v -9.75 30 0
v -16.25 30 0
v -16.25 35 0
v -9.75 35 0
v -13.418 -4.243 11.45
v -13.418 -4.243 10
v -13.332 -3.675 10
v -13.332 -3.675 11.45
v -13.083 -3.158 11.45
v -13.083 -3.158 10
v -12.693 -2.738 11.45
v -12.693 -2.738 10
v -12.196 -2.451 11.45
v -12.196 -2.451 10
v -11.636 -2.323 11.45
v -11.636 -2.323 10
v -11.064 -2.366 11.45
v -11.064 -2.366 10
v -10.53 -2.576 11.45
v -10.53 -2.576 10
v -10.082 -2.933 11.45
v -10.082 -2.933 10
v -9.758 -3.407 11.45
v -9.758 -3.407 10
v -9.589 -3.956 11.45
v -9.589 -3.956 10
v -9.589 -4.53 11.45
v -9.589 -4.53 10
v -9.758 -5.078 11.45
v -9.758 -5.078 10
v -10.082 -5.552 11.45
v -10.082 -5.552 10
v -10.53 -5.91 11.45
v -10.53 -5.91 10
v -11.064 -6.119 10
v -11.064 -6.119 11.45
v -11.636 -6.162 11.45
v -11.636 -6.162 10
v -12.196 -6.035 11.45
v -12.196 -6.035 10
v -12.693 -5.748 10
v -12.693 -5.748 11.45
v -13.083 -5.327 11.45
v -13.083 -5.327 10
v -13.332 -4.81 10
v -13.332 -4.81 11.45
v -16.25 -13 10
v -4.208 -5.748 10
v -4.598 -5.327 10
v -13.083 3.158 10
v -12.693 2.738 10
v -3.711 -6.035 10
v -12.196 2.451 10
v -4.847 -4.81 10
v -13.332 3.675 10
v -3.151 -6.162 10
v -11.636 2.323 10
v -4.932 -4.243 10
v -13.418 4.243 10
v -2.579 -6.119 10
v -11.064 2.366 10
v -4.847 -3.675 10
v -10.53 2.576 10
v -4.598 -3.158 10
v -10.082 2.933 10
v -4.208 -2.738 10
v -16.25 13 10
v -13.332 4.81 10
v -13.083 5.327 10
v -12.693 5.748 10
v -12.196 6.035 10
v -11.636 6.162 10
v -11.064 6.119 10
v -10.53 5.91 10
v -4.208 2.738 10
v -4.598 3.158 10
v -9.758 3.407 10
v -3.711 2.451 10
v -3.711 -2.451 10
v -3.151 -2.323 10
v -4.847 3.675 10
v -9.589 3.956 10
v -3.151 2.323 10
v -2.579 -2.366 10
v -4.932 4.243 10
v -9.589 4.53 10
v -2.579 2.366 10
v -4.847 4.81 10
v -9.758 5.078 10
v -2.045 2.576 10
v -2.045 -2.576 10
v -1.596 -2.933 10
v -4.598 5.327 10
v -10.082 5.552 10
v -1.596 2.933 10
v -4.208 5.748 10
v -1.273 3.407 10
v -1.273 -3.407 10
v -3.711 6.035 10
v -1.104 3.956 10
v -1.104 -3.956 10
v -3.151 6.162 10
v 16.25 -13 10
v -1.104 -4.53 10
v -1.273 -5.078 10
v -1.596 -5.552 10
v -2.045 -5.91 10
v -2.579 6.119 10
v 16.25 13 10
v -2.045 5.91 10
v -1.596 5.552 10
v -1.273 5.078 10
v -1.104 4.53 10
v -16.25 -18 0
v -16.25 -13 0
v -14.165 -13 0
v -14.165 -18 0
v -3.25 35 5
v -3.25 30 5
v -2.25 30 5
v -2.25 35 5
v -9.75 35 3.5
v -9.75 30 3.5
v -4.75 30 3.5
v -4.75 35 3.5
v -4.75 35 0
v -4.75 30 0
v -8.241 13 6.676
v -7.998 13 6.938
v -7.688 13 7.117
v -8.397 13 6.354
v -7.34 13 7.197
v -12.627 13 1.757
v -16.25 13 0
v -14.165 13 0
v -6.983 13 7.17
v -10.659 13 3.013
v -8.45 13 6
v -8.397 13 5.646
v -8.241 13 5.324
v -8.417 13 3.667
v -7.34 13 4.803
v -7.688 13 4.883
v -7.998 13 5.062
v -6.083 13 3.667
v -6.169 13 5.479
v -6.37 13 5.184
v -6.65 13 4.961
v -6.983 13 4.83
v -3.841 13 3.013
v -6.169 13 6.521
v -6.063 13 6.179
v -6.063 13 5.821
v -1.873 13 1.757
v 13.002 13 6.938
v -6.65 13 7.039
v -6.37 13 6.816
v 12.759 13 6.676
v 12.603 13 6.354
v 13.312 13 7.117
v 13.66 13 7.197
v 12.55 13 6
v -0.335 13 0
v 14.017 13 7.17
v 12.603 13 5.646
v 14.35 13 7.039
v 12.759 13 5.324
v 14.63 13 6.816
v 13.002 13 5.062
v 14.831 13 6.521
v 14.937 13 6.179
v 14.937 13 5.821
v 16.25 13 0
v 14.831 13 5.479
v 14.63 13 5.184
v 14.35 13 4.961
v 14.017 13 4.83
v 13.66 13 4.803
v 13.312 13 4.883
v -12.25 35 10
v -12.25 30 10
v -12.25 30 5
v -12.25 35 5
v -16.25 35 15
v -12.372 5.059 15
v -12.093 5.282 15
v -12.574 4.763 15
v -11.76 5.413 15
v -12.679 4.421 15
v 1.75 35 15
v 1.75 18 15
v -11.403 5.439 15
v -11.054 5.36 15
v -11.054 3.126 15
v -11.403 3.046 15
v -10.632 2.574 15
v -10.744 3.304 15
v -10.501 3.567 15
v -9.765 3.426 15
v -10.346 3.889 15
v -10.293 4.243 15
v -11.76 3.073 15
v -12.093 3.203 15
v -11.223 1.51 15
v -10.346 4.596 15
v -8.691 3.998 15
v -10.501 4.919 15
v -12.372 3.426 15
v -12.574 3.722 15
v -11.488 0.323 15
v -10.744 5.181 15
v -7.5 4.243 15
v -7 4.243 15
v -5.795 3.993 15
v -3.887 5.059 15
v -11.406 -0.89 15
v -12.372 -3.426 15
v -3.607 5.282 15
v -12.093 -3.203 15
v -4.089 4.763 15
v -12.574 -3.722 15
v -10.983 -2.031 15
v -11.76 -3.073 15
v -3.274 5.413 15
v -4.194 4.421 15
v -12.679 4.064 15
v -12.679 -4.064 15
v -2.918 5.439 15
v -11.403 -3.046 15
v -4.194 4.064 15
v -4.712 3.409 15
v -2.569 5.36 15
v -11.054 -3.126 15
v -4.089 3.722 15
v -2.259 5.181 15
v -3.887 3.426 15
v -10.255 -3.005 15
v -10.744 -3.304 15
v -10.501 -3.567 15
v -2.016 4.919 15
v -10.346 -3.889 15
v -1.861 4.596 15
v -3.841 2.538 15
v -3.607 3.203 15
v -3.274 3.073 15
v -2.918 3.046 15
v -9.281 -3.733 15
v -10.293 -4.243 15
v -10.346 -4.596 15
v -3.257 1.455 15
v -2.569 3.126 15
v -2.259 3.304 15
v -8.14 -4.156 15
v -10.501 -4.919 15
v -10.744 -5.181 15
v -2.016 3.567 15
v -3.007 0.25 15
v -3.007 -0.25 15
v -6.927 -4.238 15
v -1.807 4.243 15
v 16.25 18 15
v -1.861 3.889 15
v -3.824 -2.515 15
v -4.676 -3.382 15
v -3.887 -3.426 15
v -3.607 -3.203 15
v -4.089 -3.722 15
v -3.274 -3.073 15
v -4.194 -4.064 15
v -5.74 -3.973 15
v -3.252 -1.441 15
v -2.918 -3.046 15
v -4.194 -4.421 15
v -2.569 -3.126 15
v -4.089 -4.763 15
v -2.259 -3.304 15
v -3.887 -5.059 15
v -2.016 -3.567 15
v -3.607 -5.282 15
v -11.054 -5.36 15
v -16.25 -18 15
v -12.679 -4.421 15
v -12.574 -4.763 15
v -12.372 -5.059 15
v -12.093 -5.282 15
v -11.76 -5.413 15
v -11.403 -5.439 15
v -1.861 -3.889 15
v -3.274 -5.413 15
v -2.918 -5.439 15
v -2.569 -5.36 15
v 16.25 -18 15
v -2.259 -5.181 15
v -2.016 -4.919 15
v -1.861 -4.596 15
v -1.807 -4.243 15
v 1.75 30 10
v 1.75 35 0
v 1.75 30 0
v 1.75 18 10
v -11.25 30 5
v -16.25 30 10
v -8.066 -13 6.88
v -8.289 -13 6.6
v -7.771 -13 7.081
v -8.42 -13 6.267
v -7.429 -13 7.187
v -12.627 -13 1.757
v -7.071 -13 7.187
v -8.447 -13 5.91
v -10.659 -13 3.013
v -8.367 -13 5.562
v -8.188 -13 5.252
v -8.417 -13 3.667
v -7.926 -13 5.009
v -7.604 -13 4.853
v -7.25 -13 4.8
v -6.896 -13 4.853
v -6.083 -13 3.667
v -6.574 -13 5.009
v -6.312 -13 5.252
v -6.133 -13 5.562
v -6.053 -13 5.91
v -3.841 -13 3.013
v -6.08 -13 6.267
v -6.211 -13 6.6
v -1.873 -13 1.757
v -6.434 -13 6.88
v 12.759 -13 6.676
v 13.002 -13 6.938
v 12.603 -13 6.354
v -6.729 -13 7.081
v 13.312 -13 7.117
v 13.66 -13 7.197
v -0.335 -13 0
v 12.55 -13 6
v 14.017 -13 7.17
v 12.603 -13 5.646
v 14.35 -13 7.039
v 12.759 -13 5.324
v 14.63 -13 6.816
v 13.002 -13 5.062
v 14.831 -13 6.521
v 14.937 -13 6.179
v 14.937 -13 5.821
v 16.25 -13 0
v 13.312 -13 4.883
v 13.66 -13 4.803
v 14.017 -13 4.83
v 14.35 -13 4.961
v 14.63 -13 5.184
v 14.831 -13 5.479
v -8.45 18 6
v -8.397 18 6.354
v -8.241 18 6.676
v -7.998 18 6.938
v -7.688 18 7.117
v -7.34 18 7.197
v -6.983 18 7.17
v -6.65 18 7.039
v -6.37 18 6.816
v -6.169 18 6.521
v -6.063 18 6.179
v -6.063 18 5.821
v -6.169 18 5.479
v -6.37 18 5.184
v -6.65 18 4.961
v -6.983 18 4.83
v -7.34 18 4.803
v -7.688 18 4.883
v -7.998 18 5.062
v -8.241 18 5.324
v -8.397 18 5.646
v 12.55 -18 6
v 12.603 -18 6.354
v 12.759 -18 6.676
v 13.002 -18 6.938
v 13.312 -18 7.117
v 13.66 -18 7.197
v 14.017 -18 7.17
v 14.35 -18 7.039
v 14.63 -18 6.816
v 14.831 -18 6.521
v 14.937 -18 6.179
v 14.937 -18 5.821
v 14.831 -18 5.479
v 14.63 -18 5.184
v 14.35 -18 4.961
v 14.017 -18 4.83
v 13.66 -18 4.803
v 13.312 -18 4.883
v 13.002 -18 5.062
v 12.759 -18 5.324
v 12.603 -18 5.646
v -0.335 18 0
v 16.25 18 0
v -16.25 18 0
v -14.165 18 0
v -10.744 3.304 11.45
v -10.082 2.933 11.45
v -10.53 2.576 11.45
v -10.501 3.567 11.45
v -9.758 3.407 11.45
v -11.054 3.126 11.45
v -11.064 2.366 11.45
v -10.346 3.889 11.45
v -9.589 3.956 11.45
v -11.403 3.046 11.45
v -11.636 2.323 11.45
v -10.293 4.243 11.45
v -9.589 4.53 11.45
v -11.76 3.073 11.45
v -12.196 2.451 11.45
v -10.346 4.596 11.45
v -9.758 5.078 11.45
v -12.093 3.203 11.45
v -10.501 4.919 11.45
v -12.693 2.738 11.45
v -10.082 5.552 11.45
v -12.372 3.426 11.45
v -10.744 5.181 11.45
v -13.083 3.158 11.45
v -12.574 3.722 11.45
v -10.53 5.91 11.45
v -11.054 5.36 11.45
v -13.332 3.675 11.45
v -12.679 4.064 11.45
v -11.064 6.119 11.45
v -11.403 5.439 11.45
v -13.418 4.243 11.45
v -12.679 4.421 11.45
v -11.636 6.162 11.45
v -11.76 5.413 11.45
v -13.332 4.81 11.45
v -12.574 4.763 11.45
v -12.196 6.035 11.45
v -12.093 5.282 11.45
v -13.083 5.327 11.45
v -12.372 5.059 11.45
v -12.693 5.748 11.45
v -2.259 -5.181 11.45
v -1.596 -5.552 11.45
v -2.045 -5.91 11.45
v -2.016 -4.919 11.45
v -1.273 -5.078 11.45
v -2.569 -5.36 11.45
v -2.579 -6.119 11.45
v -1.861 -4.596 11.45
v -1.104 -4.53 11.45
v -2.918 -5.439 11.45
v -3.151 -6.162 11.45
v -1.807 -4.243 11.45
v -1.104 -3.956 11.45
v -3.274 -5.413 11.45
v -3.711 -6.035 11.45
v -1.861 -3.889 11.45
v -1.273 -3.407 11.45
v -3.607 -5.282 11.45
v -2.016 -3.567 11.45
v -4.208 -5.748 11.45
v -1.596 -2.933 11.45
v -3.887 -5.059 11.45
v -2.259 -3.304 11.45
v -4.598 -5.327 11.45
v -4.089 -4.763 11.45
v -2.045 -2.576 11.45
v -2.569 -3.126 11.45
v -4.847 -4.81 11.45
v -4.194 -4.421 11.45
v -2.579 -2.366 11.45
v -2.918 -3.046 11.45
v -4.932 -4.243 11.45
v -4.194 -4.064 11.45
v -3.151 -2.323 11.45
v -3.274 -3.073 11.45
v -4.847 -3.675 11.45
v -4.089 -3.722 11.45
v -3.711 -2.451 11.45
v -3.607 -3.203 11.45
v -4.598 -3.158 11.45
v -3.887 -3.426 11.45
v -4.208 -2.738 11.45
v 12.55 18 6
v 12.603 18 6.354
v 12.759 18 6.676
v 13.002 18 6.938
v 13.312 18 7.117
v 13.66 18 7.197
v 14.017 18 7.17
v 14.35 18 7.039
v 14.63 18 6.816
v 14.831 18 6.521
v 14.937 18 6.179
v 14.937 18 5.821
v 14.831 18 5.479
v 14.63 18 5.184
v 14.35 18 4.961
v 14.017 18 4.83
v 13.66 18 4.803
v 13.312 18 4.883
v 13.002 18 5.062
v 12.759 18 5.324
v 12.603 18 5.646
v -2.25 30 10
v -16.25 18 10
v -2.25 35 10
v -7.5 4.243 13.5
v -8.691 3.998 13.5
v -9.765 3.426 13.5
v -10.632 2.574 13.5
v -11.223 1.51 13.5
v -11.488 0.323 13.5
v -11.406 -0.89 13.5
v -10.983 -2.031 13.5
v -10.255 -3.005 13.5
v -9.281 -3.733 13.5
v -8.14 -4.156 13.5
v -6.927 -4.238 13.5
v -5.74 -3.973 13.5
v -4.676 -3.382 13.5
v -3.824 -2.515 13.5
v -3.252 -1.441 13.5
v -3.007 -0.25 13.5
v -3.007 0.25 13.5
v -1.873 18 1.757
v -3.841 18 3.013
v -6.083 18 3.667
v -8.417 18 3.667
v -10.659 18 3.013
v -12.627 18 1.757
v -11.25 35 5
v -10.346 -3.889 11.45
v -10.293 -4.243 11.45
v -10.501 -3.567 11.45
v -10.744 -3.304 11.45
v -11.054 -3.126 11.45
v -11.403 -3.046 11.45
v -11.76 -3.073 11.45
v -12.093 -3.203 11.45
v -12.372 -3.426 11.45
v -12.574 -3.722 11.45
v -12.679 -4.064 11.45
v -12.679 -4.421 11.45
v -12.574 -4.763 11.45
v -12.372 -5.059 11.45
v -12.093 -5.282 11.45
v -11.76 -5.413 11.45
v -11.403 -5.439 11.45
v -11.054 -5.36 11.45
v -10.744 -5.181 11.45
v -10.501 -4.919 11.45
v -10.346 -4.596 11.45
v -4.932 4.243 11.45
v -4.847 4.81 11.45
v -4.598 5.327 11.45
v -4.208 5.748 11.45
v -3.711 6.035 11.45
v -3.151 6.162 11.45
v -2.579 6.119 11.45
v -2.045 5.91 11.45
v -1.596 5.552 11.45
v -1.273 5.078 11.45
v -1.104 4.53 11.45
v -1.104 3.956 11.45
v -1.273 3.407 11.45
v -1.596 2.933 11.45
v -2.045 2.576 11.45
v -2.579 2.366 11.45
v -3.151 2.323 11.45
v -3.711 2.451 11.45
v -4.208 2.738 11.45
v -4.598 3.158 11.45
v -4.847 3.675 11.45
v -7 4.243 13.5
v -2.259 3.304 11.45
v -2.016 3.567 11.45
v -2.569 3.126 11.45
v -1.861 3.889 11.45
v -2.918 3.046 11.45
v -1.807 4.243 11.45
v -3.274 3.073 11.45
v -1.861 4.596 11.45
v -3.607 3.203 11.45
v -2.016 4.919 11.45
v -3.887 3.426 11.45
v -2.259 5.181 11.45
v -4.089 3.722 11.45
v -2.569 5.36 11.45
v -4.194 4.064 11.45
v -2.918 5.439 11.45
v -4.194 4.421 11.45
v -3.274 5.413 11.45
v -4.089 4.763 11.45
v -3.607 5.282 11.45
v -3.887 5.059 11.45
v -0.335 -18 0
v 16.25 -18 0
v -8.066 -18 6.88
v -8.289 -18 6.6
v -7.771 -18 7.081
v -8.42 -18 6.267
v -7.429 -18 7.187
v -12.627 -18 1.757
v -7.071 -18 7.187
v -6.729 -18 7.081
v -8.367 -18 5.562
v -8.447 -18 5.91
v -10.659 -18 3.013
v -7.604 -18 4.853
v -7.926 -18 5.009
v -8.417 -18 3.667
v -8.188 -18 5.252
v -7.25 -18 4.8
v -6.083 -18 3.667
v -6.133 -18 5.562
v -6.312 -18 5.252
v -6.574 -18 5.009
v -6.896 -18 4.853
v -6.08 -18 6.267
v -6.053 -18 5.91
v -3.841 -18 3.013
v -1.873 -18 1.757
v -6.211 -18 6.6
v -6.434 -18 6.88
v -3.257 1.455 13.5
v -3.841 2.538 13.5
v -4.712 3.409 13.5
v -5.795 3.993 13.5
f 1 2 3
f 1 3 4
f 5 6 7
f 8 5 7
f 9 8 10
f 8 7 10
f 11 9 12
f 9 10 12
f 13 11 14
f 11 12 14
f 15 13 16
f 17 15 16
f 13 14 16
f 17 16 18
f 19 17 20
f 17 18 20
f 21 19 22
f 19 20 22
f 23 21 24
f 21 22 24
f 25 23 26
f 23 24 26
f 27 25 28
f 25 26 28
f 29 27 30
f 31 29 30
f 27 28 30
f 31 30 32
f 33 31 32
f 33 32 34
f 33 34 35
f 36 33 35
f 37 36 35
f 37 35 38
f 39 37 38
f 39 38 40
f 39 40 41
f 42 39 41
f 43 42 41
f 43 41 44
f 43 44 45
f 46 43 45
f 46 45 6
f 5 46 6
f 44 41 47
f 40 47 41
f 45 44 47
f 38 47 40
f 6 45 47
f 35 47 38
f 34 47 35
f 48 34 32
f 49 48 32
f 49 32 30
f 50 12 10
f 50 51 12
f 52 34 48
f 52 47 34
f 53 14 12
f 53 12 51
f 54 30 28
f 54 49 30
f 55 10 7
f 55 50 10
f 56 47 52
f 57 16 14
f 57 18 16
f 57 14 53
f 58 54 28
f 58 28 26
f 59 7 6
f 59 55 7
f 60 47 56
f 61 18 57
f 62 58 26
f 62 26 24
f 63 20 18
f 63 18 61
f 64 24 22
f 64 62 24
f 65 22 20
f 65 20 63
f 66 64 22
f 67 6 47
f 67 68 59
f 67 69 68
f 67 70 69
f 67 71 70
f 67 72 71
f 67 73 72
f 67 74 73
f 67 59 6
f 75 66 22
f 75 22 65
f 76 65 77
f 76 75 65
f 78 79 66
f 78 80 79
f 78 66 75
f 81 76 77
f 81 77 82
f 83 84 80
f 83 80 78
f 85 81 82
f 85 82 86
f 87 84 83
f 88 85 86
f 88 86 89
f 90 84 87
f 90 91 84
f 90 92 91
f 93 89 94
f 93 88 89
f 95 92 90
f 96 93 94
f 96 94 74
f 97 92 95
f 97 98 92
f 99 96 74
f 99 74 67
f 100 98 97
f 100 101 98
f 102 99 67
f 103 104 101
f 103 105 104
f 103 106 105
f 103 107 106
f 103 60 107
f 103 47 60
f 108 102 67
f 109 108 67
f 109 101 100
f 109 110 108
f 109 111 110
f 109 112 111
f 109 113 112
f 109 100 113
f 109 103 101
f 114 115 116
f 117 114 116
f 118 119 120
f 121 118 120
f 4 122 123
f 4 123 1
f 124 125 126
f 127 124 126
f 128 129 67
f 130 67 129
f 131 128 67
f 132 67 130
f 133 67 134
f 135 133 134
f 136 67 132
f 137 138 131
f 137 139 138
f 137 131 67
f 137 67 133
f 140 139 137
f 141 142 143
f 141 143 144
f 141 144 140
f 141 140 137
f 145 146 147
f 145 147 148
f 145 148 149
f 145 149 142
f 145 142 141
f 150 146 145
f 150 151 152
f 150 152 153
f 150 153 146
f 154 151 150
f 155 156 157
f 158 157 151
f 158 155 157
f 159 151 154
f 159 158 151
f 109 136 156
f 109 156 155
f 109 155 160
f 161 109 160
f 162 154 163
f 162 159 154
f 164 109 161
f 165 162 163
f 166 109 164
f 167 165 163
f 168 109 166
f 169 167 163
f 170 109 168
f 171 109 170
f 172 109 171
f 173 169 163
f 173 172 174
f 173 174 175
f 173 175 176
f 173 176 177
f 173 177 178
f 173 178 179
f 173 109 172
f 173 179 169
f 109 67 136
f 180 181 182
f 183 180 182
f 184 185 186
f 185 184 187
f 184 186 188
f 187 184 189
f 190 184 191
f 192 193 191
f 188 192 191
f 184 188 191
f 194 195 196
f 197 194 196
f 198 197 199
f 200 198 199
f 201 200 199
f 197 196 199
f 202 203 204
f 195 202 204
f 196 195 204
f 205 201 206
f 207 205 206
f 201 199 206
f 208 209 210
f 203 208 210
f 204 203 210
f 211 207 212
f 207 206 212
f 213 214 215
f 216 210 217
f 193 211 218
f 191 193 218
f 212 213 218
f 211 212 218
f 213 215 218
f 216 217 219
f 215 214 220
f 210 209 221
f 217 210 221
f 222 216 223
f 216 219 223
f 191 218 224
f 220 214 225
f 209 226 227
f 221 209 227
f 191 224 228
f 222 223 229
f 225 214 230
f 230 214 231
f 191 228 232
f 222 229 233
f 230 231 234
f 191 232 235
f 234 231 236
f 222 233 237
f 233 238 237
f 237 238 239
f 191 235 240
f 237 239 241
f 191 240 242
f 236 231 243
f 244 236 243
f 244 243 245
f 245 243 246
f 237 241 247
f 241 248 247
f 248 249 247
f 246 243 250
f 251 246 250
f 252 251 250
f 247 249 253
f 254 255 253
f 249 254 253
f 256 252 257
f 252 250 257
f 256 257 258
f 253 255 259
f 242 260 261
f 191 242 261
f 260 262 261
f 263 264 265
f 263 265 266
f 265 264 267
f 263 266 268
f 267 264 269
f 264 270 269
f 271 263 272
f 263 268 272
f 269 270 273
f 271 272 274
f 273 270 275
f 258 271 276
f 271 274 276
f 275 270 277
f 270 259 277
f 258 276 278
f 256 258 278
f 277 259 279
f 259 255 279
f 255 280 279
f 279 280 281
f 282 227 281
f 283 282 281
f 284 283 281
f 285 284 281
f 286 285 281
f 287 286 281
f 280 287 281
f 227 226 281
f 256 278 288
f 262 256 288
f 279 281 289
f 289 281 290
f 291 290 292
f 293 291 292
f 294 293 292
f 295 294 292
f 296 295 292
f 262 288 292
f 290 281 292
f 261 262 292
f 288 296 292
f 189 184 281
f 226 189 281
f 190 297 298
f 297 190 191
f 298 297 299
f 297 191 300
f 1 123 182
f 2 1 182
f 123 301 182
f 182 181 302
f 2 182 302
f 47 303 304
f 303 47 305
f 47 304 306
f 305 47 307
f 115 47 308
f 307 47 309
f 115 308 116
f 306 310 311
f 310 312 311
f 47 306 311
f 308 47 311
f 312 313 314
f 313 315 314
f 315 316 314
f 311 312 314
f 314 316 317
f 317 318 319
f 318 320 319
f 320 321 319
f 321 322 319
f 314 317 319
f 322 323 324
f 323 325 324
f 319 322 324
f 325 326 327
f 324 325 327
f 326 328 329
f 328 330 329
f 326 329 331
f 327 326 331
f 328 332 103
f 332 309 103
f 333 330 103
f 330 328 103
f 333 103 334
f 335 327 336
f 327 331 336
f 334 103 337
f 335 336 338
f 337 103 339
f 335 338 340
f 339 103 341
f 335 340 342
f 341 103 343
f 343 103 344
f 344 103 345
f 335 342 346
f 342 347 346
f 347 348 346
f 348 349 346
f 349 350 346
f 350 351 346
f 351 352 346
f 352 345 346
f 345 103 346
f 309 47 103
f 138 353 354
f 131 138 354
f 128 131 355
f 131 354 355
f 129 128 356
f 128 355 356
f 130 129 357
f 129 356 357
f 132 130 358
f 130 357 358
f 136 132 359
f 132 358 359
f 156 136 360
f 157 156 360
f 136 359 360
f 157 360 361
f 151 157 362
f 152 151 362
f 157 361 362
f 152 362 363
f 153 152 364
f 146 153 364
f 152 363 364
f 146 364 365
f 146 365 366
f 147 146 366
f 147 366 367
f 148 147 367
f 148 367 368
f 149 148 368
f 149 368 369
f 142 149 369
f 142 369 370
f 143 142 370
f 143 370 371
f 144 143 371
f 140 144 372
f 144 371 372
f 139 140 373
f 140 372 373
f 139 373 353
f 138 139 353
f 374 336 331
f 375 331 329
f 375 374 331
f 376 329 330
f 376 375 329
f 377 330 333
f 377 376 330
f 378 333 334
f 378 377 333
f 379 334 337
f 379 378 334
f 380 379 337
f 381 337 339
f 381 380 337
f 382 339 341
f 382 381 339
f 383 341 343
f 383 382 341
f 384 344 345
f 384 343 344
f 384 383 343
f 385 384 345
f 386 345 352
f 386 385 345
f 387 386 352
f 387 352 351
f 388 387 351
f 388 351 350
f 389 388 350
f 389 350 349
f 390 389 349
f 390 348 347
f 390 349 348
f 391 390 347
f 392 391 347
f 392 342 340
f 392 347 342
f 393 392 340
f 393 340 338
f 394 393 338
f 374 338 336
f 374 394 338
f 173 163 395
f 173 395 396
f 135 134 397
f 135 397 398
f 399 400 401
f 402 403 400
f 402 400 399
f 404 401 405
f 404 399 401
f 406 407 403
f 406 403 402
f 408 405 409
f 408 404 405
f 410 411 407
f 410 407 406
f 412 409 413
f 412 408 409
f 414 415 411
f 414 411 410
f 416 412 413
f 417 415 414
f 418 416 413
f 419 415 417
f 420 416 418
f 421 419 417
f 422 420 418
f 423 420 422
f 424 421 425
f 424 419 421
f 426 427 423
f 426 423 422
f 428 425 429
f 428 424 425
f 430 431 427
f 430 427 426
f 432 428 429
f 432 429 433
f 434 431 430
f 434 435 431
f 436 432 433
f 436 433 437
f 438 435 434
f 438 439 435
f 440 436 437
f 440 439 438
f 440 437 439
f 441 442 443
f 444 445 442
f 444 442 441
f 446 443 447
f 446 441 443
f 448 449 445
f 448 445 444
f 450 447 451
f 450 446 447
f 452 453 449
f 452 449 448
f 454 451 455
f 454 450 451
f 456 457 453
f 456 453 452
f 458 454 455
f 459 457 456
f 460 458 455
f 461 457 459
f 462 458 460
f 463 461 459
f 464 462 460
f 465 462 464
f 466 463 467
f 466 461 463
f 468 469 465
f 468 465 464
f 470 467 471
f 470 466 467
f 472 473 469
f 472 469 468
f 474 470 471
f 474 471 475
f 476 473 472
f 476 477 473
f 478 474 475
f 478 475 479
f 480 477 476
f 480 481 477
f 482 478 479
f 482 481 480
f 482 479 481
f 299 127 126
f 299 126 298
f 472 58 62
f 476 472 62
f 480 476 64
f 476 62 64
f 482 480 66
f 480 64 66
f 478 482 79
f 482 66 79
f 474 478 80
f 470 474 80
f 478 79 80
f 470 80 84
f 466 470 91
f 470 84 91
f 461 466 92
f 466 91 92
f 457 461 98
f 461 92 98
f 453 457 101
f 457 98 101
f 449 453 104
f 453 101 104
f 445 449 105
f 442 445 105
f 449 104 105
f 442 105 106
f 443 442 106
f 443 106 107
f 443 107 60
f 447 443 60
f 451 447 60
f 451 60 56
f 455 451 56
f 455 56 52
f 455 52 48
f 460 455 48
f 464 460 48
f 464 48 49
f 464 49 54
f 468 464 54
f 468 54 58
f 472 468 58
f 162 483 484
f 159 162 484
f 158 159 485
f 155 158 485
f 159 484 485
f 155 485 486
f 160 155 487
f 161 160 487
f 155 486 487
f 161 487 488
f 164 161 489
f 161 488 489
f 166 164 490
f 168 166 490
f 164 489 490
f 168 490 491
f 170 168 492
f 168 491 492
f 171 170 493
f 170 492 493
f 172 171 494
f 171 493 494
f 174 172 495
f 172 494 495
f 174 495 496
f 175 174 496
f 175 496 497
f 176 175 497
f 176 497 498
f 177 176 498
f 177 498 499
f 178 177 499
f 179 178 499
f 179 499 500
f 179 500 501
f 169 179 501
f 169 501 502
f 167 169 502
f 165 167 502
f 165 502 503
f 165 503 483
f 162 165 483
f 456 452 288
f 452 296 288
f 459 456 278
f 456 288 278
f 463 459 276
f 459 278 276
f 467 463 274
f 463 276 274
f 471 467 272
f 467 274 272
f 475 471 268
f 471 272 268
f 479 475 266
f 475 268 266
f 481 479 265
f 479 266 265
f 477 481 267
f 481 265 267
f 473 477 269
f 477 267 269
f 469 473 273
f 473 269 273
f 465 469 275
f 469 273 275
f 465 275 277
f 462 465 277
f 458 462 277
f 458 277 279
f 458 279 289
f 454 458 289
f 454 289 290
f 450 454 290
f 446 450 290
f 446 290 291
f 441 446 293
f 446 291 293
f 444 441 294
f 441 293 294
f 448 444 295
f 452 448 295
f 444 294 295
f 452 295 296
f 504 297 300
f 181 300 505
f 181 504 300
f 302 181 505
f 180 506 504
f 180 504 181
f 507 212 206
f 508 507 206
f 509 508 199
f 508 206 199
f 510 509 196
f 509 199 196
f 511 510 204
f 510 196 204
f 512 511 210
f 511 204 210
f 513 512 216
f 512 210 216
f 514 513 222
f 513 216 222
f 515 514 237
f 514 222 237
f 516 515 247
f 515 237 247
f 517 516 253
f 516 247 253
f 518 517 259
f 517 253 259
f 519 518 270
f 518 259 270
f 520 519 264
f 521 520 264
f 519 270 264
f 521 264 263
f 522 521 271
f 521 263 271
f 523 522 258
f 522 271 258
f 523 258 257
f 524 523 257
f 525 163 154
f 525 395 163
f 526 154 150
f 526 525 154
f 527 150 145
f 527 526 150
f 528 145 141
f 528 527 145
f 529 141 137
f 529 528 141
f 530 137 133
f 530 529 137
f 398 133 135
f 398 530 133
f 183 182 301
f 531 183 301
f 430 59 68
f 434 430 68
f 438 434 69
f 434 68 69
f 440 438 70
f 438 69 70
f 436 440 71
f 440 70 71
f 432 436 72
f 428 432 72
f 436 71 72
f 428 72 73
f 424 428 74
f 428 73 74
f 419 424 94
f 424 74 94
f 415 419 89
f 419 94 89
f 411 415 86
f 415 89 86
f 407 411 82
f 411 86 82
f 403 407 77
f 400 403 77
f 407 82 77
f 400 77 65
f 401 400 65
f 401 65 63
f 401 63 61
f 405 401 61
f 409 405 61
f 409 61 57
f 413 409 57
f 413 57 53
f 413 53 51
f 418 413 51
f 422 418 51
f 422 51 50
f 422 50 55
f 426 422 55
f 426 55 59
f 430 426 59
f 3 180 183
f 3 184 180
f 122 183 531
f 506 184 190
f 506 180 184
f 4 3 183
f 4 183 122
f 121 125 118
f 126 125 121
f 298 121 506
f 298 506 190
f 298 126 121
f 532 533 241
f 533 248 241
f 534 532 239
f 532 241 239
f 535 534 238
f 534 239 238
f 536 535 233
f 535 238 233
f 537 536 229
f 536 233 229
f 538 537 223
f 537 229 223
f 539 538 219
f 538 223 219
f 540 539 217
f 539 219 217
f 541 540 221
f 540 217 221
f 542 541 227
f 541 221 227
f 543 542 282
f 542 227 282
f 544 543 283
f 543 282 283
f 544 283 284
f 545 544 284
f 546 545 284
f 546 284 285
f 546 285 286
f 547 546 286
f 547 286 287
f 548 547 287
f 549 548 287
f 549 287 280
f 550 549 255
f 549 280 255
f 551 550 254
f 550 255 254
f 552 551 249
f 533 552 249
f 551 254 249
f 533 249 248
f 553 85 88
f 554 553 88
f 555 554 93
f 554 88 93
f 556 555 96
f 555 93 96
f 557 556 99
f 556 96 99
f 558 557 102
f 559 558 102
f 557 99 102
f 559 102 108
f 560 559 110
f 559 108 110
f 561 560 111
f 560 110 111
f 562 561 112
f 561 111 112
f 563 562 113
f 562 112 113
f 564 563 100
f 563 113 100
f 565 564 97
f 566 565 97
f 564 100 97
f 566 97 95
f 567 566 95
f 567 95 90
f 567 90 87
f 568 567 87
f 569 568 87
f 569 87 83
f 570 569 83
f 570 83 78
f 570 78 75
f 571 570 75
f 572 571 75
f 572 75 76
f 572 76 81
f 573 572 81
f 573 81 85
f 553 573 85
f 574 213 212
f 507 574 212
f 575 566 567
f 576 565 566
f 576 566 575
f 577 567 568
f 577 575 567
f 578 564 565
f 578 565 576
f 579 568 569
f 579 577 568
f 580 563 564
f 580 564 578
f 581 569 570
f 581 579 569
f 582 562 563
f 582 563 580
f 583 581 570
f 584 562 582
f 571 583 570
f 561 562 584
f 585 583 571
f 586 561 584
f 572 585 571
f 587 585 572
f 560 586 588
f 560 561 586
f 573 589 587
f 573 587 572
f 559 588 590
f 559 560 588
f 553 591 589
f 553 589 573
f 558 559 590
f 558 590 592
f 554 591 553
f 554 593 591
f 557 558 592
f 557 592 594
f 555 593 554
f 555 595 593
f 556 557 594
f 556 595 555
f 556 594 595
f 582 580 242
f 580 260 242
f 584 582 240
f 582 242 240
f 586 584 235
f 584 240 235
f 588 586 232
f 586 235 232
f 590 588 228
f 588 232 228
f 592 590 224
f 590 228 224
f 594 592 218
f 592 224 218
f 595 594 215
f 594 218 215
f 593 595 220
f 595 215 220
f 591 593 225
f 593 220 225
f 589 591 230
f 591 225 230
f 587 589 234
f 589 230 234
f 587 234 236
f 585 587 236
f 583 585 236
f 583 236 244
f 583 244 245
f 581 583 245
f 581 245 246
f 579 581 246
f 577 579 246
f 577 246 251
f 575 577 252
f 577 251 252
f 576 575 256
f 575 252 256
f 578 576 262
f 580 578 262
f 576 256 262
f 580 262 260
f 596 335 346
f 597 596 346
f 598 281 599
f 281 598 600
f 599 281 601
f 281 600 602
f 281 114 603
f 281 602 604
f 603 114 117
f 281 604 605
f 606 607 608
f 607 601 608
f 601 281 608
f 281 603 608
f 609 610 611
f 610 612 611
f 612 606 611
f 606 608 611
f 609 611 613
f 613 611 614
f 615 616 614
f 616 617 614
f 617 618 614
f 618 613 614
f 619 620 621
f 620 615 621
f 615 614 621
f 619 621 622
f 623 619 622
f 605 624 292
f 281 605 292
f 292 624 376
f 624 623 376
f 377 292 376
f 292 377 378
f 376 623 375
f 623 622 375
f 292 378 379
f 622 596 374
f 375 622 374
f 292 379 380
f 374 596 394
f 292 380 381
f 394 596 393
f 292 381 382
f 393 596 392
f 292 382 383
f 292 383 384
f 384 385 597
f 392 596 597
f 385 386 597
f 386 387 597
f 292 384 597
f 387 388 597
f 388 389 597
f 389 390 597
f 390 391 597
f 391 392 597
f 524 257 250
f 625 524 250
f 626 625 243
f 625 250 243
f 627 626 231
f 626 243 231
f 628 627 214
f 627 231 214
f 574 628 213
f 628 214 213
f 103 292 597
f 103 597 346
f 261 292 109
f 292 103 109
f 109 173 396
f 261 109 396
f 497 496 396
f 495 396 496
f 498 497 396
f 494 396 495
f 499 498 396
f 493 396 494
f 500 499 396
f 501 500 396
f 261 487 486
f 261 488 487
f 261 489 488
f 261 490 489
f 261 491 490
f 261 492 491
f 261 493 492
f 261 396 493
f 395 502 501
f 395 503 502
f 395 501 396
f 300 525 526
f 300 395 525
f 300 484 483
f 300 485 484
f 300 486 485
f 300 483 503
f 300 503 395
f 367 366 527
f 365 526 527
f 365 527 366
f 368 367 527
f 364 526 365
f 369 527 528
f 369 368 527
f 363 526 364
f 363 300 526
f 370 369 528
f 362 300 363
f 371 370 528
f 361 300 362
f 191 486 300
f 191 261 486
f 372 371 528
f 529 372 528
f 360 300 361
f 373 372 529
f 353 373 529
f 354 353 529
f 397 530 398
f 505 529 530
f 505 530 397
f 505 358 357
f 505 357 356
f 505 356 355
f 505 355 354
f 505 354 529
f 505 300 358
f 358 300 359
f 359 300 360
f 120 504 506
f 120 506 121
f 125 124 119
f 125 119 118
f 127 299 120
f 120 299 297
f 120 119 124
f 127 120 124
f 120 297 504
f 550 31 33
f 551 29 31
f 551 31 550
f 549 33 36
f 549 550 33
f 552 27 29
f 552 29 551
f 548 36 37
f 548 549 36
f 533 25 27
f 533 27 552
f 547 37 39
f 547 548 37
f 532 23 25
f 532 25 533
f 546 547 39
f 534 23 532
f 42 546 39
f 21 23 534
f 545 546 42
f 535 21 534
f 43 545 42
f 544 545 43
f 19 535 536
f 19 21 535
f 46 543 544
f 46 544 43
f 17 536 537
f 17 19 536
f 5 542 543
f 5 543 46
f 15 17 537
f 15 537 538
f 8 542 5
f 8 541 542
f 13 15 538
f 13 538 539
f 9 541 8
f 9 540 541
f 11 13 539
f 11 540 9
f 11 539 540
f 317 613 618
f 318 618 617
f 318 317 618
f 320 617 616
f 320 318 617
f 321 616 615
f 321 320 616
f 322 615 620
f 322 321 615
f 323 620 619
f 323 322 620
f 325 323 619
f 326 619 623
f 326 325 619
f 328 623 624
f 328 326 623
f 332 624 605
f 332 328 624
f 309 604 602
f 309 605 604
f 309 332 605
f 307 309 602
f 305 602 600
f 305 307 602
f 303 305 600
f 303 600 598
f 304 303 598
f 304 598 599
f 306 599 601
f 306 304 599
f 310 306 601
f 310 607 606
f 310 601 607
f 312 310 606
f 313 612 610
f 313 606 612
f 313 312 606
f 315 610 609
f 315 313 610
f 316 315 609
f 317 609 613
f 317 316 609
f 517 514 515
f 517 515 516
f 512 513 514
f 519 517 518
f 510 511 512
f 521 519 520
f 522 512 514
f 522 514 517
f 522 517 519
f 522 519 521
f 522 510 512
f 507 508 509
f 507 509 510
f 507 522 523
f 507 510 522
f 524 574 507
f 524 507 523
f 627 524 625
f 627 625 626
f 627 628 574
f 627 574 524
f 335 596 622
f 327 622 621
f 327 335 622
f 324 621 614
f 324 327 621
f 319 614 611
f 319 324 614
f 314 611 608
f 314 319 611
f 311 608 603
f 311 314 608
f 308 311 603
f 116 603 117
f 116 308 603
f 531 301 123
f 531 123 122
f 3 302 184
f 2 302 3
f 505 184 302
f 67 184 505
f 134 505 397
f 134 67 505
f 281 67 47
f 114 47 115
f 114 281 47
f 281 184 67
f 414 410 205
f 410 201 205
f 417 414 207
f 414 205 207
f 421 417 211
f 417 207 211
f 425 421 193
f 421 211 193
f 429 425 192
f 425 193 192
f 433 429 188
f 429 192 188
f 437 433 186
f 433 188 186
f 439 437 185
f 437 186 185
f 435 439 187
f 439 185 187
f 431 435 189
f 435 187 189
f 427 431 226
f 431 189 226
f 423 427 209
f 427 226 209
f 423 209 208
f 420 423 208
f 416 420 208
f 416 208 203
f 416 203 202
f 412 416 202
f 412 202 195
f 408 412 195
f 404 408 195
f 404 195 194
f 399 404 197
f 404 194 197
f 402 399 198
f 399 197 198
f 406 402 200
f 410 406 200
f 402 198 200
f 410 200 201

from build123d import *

# Parameters (mm, degrees)
SKETCH_1_W                   = 32.5
SKETCH_1_H                   = 36
EXTRUDE_1_DEPTH              = 15
SKETCH_2_W                   = 10
SKETCH_2_H                   = 26
CUT_EXTRUDE_1_DEPTH          = 41.065571255
HOLE_WIZARD_M2_1_D           = 2.4
HOLE_WIZARD_M2_1_DEPTH       = 5
CUT_EXTRUDE_3_DEPTH          = 39.079686186
CUT_EXTRUDE_3_DEPTH_BACK     = 39.079686186
SKETCH_4_R                   = 8.25
SKETCH_4_R_2                 = 1.2
HOLE_WIZARD_M2_2_D           = 2.4
HOLE_WIZARD_M2_2_CBORE_D     = 3.85
HOLE_WIZARD_M2_2_CBORE_DEPTH = 1.45
SKETCH_13_W                  = 18
SKETCH_13_H                  = 15
EXTRUDE_3_DEPTH              = 17
CUT_EXTRUDE_4_DEPTH          = 42.401237904
CUT_EXTRUDE_4_DEPTH_BACK     = 10
SKETCH_14_W                  = 18
SKETCH_14_H                  = 12
CUT_EXTRUDE_5_REACH          = 59.429
SKETCH_15_W                  = 5
SKETCH_15_H                  = 10
CUT_EXTRUDE_START            = -5
SKETCH_16_W                  = 10
SKETCH_16_H                  = 5
CUT_EXTRUDE_6_DEPTH          = 5
CHAMFER_1_SIZE               = 1.5
CUT_EXTRUDE_7_DEPTH          = 1.5


with BuildPart() as part:
    # ｽｹｯﾁ1 → ﾎﾞｽ - 押し出し1 (new body)
    with BuildSketch(Plane.XY):
        Rectangle(SKETCH_1_W, SKETCH_1_H)
    extrude(amount=EXTRUDE_1_DEPTH)

    # ｽｹｯﾁ2 → ｶｯﾄ - 押し出し1 (cut, through all)
    with BuildSketch(Plane(origin=(16.25, 0, 0), x_dir=(0, 0, -1), z_dir=(1, 0, 0))):
        with Locations((-5, 0)):
            Rectangle(SKETCH_2_W, SKETCH_2_H)
    extrude(amount=-CUT_EXTRUDE_1_DEPTH, mode=Mode.SUBTRACT)

    # M2 すきま穴1
    with Locations(Plane.XZ.offset(-13)):
        with Locations((13.75, 6), (-7.25, 6)):
            hole_wizard_m2_1 = Hole(HOLE_WIZARD_M2_1_D / 2, depth=HOLE_WIZARD_M2_1_DEPTH)

    # ｽｹｯﾁ4 → ｶｯﾄ - 押し出し3 (cut, two sides: drawn at the far end of the back side and taken through both)
    with BuildSketch(Plane.XZ.offset(-13).offset(-CUT_EXTRUDE_3_DEPTH_BACK)):
        with Locations((-7.25, -4.5)):
            Circle(SKETCH_4_R)
        with Locations(Location((-7.25, 6, 0), (0, 0, 270))):
            Circle(SKETCH_4_R_2)
    extrude(amount=CUT_EXTRUDE_3_DEPTH + CUT_EXTRUDE_3_DEPTH_BACK, mode=Mode.SUBTRACT)

    # ﾐﾗｰ1: M2 すきま穴1 across plane
    add(hole_wizard_m2_1.mirror(Plane.ZX), mode=Mode.SUBTRACT)

    # M2 丸平ねじ用座ぐり穴2 (through all)
    with Locations(Plane(origin=(0, 0, 10), x_dir=(-1, 0, 0), z_dir=(0, 0, -1))):
        with Locations((11.492640687, 4.242640687), (3.007359313, -4.242640687), (11.492640687, -4.242640687), (3.007359313, 4.242640687)):
            CounterBoreHole(HOLE_WIZARD_M2_2_D / 2, HOLE_WIZARD_M2_2_CBORE_D / 2, HOLE_WIZARD_M2_2_CBORE_DEPTH)

    # ｽｹｯﾁ13 → ﾎﾞｽ - 押し出し3 (add)
    with BuildSketch(Plane(origin=(0, 18, 0), x_dir=(1, 0, 0), z_dir=(0, 1, 0))):
        with Locations((-7.25, -7.5)):
            Rectangle(SKETCH_13_W, SKETCH_13_H)
    extrude(amount=EXTRUDE_3_DEPTH)

    # ｽｹｯﾁ14 → ｶｯﾄ - 押し出し4 (cut, two sides: drawn at the far end of the back side and taken through both)
    with BuildSketch(Plane(origin=(0, 0, 0), x_dir=(-1, 0, 0), z_dir=(0, 0, -1)).offset(-CUT_EXTRUDE_4_DEPTH_BACK)):
        with Locations((7.25, 24)):
            Rectangle(SKETCH_14_W, SKETCH_14_H)
    extrude(amount=CUT_EXTRUDE_4_DEPTH + CUT_EXTRUDE_4_DEPTH_BACK, mode=Mode.SUBTRACT)

    # ｽｹｯﾁ15 → ｶｯﾄ - 押し出し5 (cut, up to next)
    with BuildSketch(Plane(origin=(0, 35, 0), x_dir=(1, 0, 0), z_dir=(0, 1, 0)), mode=Mode.PRIVATE) as cut_extrude_5_sk1:
        with Locations((-7.25, -5)):
            Rectangle(SKETCH_15_W, SKETCH_15_H)
    cut_extrude_5_tool1 = extrude(cut_extrude_5_sk1.sketch, amount=-CUT_EXTRUDE_5_REACH, mode=Mode.PRIVATE) & part.part
    add(cut_extrude_5_tool1.solids().sort_by_distance((-7.25, 35, 5))[0], mode=Mode.SUBTRACT)

    # ｽｹｯﾁ16 → ｶｯﾄ - 押し出し6 (cut)
    with BuildSketch(Plane(origin=(0, 35, 0), x_dir=(1, 0, 0), z_dir=(0, 1, 0)).offset(CUT_EXTRUDE_START)):
        with Locations((-7.25, -7.5)):
            Rectangle(SKETCH_16_W, SKETCH_16_H)
    extrude(amount=CUT_EXTRUDE_6_DEPTH, mode=Mode.SUBTRACT)

    # 面取り1
    chamfer_1_edges = [part.edges().sort_by_distance(p)[0] for p in [
        (-9.75, 32.5, 5),
        (-4.75, 32.5, 5),
    ]]
    chamfer(chamfer_1_edges, length=CHAMFER_1_SIZE)

    # ｽｹｯﾁ17 → ｶｯﾄ - 押し出し7 (cut)
    with BuildSketch(Plane.XY.offset(15)):
        with BuildLine():
            Line((-7, 4.242640687), (-7.5, 4.242640687))
            ThreePointArc((-7.5, 4.242640687), (-10.25520382, -3.00520382), (-3.007359313, -0.25))
            Line((-3.007359313, -0.25), (-3.007359313, 0.25))
            ThreePointArc((-3.007359313, 0.25), (-4.24479618, 3.00520382), (-7, 4.242640687))
        make_face()
    extrude(amount=-CUT_EXTRUDE_7_DEPTH, mode=Mode.SUBTRACT)


solid = part.part
